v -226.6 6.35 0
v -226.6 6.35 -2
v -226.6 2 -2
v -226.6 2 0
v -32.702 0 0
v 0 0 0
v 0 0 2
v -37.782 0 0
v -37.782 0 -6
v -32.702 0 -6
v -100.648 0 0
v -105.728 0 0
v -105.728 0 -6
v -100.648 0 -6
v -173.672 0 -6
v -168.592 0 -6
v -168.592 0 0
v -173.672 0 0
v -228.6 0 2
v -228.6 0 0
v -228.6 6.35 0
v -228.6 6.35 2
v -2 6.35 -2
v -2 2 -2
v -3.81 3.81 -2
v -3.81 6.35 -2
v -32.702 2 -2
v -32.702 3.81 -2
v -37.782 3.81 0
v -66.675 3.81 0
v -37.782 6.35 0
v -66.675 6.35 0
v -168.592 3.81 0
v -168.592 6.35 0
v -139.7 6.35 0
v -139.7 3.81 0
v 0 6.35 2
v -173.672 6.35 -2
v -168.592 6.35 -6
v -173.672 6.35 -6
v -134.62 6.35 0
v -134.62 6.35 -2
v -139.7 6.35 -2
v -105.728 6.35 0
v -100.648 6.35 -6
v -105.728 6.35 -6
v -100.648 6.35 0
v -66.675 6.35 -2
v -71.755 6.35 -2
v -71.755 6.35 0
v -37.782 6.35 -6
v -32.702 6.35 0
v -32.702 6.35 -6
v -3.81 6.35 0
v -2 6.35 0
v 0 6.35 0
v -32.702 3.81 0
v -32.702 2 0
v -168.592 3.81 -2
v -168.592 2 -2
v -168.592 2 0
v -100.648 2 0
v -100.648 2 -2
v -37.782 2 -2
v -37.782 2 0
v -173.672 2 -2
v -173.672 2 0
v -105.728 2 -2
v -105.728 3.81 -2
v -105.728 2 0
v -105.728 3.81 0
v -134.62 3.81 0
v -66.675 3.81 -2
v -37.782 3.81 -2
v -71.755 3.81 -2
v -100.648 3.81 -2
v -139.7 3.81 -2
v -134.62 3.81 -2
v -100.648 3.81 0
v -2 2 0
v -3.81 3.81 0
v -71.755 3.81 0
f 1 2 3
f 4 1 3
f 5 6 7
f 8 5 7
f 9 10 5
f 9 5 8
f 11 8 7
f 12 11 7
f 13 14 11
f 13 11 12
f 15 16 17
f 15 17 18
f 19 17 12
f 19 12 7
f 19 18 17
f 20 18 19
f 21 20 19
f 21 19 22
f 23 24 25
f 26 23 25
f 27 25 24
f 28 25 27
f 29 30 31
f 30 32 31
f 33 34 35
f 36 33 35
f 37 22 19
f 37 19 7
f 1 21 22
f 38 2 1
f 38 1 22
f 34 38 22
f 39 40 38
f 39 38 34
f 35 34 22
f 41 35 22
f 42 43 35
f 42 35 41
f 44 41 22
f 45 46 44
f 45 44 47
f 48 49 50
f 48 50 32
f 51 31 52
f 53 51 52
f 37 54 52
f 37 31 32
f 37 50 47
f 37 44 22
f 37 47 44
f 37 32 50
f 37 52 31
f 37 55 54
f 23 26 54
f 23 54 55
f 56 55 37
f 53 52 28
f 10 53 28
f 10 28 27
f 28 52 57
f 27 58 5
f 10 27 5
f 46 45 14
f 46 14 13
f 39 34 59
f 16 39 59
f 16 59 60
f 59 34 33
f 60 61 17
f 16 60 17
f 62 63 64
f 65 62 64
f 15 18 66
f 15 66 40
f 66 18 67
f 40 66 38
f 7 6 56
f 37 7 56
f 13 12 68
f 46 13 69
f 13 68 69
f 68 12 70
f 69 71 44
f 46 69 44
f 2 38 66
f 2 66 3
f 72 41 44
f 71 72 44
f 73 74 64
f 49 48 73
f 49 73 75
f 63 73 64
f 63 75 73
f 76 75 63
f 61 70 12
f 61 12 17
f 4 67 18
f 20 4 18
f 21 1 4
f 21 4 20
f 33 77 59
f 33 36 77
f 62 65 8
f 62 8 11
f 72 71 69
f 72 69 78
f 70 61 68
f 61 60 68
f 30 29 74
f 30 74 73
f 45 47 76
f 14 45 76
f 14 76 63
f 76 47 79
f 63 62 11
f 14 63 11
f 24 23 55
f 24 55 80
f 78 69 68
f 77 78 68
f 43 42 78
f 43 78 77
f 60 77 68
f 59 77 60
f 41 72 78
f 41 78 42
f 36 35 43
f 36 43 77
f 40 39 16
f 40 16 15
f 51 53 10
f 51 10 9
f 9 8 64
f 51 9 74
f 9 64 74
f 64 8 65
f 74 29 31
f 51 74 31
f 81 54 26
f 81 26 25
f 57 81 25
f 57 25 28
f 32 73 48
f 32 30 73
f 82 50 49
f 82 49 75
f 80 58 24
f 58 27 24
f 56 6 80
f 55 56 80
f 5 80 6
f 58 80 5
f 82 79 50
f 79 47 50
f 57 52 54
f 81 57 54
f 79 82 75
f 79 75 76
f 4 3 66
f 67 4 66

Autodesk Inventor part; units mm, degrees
ref_plane "YZ Plane" through (0, 0, 0) normal (1, 0, 0) x (0, 1, 0)
ref_plane "XZ Plane" through (0, 0, 0) normal (0, 1, 0) x (-1, 0, 0)
ref_plane "XY Plane" through (0, 0, 0) normal (0, 0, 1) x (1, 0, 0)
sketch "Sketch1" plane through (0, 0, 0) normal (0, 0, 1) x (1, 0, 0)
  line L0 (0, 0) -> (-6.35, 0) construction
  line L1 (-6.35, 0) -> (-6.35, 6.35) construction
  line L2 (-6.35, 6.35) -> (0, 6.35) construction
  line L3 (0, 6.35) -> (0, 0) construction
  line L4 (-6.35, 6.35) -> (-30.1625, 6.35)
  line L5 (-30.1625, 6.35) -> (-30.1625, 28.575)
  line L6 (-30.1625, 28.575) -> (-6.35, 28.575)
  line L7 (-6.35, 28.575) -> (-6.35, 6.35)
  line L8 (-30.1625, 6.35) -> (-35.2425, 6.35) construction
  line L9 (-35.2425, 6.35) -> (-35.2425, 0) construction
  line L10 (-35.2425, 0) -> (-30.1625, 0) construction
  line L11 (-30.1625, 0) -> (-30.1625, 6.35) construction
  line L12 (-40.3225, 6.35) -> (-64.135, 6.35)
  line L13 (-64.135, 6.35) -> (-64.135, 28.575)
  line L14 (-64.135, 28.575) -> (-40.3225, 28.575)
  line L15 (-40.3225, 28.575) -> (-40.3225, 6.35)
  line L16 (-64.135, 6.35) -> (-69.215, 6.35) construction
  line L17 (-69.215, 6.35) -> (-69.215, 0) construction
  line L18 (-69.215, 0) -> (-64.135, 0) construction
  line L19 (-64.135, 0) -> (-64.135, 6.35) construction
  line L20 (-74.295, 6.35) -> (-98.1075, 6.35)
  line L21 (-98.1075, 6.35) -> (-98.1075, 28.575)
  line L22 (-98.1075, 28.575) -> (-74.295, 28.575)
  line L23 (-74.295, 28.575) -> (-74.295, 6.35)
  line L24 (-98.1075, 6.35) -> (-103.1875, 6.35) construction
  line L25 (-103.1875, 6.35) -> (-103.1875, 0) construction
  line L26 (-103.1875, 0) -> (-98.1075, 0) construction
  line L27 (-98.1075, 0) -> (-98.1075, 6.35) construction
  line L28 (-108.2675, 6.35) -> (-132.08, 6.35)
  line L29 (-132.08, 6.35) -> (-132.08, 28.575)
  line L30 (-132.08, 28.575) -> (-108.2675, 28.575)
  line L31 (-108.2675, 28.575) -> (-108.2675, 6.35)
  line L32 (-132.08, 6.35) -> (-137.16, 6.35) construction
  line L33 (-137.16, 6.35) -> (-137.16, 0) construction
  line L34 (-137.16, 0) -> (-132.08, 0) construction
  line L35 (-132.08, 0) -> (-132.08, 6.35) construction
  line L36 (-6.35, 40.005) -> (-30.1625, 40.005)
  line L37 (-30.1625, 40.005) -> (-30.1625, 62.23)
  line L38 (-30.1625, 62.23) -> (-6.35, 62.23)
  line L39 (-6.35, 62.23) -> (-6.35, 40.005)
  line L40 (-30.1625, 40.005) -> (-35.2425, 40.005) construction
  line L41 (-35.2425, 40.005) -> (-35.2425, 33.655) construction
  line L42 (-35.2425, 33.655) -> (-30.1625, 33.655) construction
  line L43 (-30.1625, 33.655) -> (-30.1625, 40.005) construction
  line L44 (-40.3225, 40.005) -> (-64.135, 40.005)
  line L45 (-64.135, 40.005) -> (-64.135, 62.23)
  line L46 (-64.135, 62.23) -> (-40.3225, 62.23)
  line L47 (-40.3225, 62.23) -> (-40.3225, 40.005)
  line L48 (-64.135, 40.005) -> (-69.215, 40.005) construction
  line L49 (-69.215, 40.005) -> (-69.215, 33.655) construction
  line L50 (-69.215, 33.655) -> (-64.135, 33.655) construction
  line L51 (-64.135, 33.655) -> (-64.135, 40.005) construction
  line L52 (-74.295, 40.005) -> (-98.1075, 40.005)
  line L53 (-98.1075, 40.005) -> (-98.1075, 62.23)
  line L54 (-98.1075, 62.23) -> (-74.295, 62.23)
  line L55 (-74.295, 62.23) -> (-74.295, 40.005)
  line L56 (-98.1075, 40.005) -> (-103.1875, 40.005) construction
  line L57 (-103.1875, 40.005) -> (-103.1875, 33.655) construction
  line L58 (-103.1875, 33.655) -> (-98.1075, 33.655) construction
  line L59 (-98.1075, 33.655) -> (-98.1075, 40.005) construction
  line L60 (-108.2675, 40.005) -> (-132.08, 40.005)
  line L61 (-132.08, 40.005) -> (-132.08, 62.23)
  line L62 (-132.08, 62.23) -> (-108.2675, 62.23)
  line L63 (-108.2675, 62.23) -> (-108.2675, 40.005)
  line L64 (-132.08, 40.005) -> (-137.16, 40.005) construction
  line L65 (-137.16, 40.005) -> (-137.16, 33.655) construction
  line L66 (-137.16, 33.655) -> (-132.08, 33.655) construction
  line L67 (-132.08, 33.655) -> (-132.08, 40.005) construction
  line L68 (0, -0.5542) -> (0, 69.2958)
  line L69 (0, 62.9458) -> (0, 69.2958)
  line L70 (-142.24, 6.35) -> (-166.0525, 6.35)
  line L71 (-166.0525, 6.35) -> (-166.0525, 28.575)
  line L72 (-166.0525, 28.575) -> (-142.24, 28.575)
  line L73 (-142.24, 28.575) -> (-142.24, 6.35)
  line L74 (-166.0525, 6.35) -> (-171.1325, 6.35) construction
  line L75 (-171.1325, 6.35) -> (-171.1325, 0) construction
  line L76 (-171.1325, 0) -> (-166.0525, 0) construction
  line L77 (-166.0525, 0) -> (-166.0525, 6.35) construction
  line L78 (-142.24, 40.005) -> (-166.0525, 40.005)
  line L79 (-166.0525, 40.005) -> (-166.0525, 62.23)
  line L80 (-166.0525, 62.23) -> (-142.24, 62.23)
  line L81 (-142.24, 62.23) -> (-142.24, 40.005)
  line L82 (-166.0525, 40.005) -> (-171.1325, 40.005) construction
  line L83 (-171.1325, 40.005) -> (-171.1325, 33.655) construction
  line L84 (-171.1325, 33.655) -> (-166.0525, 33.655) construction
  line L85 (-166.0525, 33.655) -> (-166.0525, 40.005) construction
  line L86 (0, 0) -> (-228.6, 0)
  line L87 (-228.6, 0) -> (-228.6, 69.85)
  line L88 (-228.6, 69.85) -> (0, 69.85)
  line L89 (0, 69.85) -> (0, 0)
  circle A0 centre (-181.6894, 55.6895) radius 6.5405
  line L90 (-228.6, 0) -> (-173.696, 0) construction
  line L91 (-173.696, 69.85) -> (-228.6, 69.85) construction
  line L92 (-228.6, 69.85) -> (-228.6, 0) construction
  line L93 (-228.6, 69.85) -> (-228.6, 42.1979) construction
  line L94 (-228.6, 42.1979) -> (-228.6, 34.925) construction
  line L95 (-228.6, 69.85) -> (-166.0525, 69.85) construction
  line L96 (-166.0525, 69.85) -> (-166.0525, 0) construction
  line L97 (-166.0525, 0) -> (-228.6, 0) construction
  line L98 (-228.6, 0) -> (-228.6, 69.85) construction
  line L99 (-166.0525, 69.85) -> (-197.3262, 69.85) construction
  line L100 (-197.3262, 69.85) -> (-197.3262, 0) construction
  line L101 (-197.3262, 0) -> (-166.0525, 0) construction
  line L102 (-166.0525, 0) -> (-166.0525, 69.85) construction
  circle A1 centre (-181.6894, 36.6395) radius 6.5405
  circle A2 centre (-181.6894, 17.5895) radius 6.5405
  circle A3 centre (-212.9631, 55.6895) radius 6.5405
  circle A4 centre (-212.9631, 36.6395) radius 6.5405
  circle A5 centre (-212.9631, 17.5895) radius 6.5405
  point P0 (-40.3225, 0)
  point P1 (-74.295, 0)
  point P2 (-108.2675, 0)
  point P3 (-6.35, 33.655)
  point P4 (-40.3225, 33.655)
  point P5 (-74.295, 33.655)
  point P6 (-108.2675, 33.655)
  point P7 (-142.24, 0)
  point P8 (-142.24, 33.655)
  point P9 (-181.6894, 69.85)
  dimension "d0" = 6.35
  dimension "d1" = 6.35
  dimension "d2" = 23.8125
  dimension "d3" = 22.225
  dimension "d4" = 5.08
  dimension "d7" = 33.9725
  dimension "d10" = 33.655
  dimension "d13" = 69.85
  dimension "d16" = 228.6
  dimension "d17" = 69.85
  dimension "d58" = 13.081
  dimension "d59" = 14.1605
  dimension "d62" = 19.05
extrude "Extrusion1" add sketch "Sketch1" along normal blind 2
sketch "Sketch3" plane through (0, 0, 0) normal (0, 0, -1) x (-1, 0, 0)
  line L0 (228.6, 69.85) -> (228.6, 0) projected
  line L1 (0, 69.85) -> (228.6, 69.85) projected
  line L2 (0, 0) -> (0, 69.85) projected
  line L3 (228.6, 0) -> (0, 0) projected
  circle A0 centre (181.6894, 55.6895) radius 6.5405 projected
  line L4 (142.24, 40.005) -> (166.0525, 40.005) projected
  line L5 (142.24, 62.23) -> (142.24, 40.005) projected
  line L6 (166.0525, 62.23) -> (142.24, 62.23) projected
  line L7 (166.0525, 40.005) -> (166.0525, 62.23) projected
  line L8 (142.24, 6.35) -> (166.0525, 6.35) projected
  line L9 (142.24, 28.575) -> (142.24, 6.35) projected
  line L10 (166.0525, 28.575) -> (142.24, 28.575) projected
  line L11 (166.0525, 6.35) -> (166.0525, 28.575) projected
  line L12 (108.2675, 40.005) -> (132.08, 40.005) projected
  line L13 (108.2675, 62.23) -> (108.2675, 40.005) projected
  line L14 (132.08, 62.23) -> (108.2675, 62.23) projected
  line L15 (132.08, 40.005) -> (132.08, 62.23) projected
  line L16 (74.295, 40.005) -> (98.1075, 40.005) projected
  line L17 (74.295, 62.23) -> (74.295, 40.005) projected
  line L18 (98.1075, 62.23) -> (74.295, 62.23) projected
  line L19 (98.1075, 40.005) -> (98.1075, 62.23) projected
  line L20 (40.3225, 40.005) -> (64.135, 40.005) projected
  line L21 (40.3225, 62.23) -> (40.3225, 40.005) projected
  line L22 (64.135, 62.23) -> (40.3225, 62.23) projected
  line L23 (64.135, 40.005) -> (64.135, 62.23) projected
  line L24 (6.35, 40.005) -> (30.1625, 40.005) projected
  line L25 (6.35, 62.23) -> (6.35, 40.005) projected
  line L26 (30.1625, 62.23) -> (6.35, 62.23) projected
  line L27 (30.1625, 40.005) -> (30.1625, 62.23) projected
  line L28 (108.2675, 6.35) -> (132.08, 6.35) projected
  line L29 (108.2675, 28.575) -> (108.2675, 6.35) projected
  line L30 (132.08, 28.575) -> (108.2675, 28.575) projected
  line L31 (132.08, 6.35) -> (132.08, 28.575) projected
  line L32 (74.295, 6.35) -> (98.1075, 6.35) projected
  line L33 (74.295, 28.575) -> (74.295, 6.35) projected
  line L34 (98.1075, 28.575) -> (74.295, 28.575) projected
  line L35 (98.1075, 6.35) -> (98.1075, 28.575) projected
  line L36 (40.3225, 6.35) -> (64.135, 6.35) projected
  line L37 (40.3225, 28.575) -> (40.3225, 6.35) projected
  line L38 (64.135, 28.575) -> (40.3225, 28.575) projected
  line L39 (64.135, 6.35) -> (64.135, 28.575) projected
  line L40 (6.35, 6.35) -> (30.1625, 6.35) projected
  line L41 (6.35, 28.575) -> (6.35, 6.35) projected
  line L42 (30.1625, 28.575) -> (6.35, 28.575) projected
  line L43 (30.1625, 6.35) -> (30.1625, 28.575) projected
  line L44 (3.81, 37.465) -> (32.7025, 37.465)
  line L45 (32.7025, 37.465) -> (32.7025, 64.77)
  line L46 (32.7025, 64.77) -> (3.81, 64.77)
  line L47 (3.81, 64.77) -> (3.81, 37.465)
  line L48 (37.7825, 37.465) -> (66.675, 37.465)
  line L49 (66.675, 37.465) -> (66.675, 64.77)
  line L50 (66.675, 64.77) -> (37.7825, 64.77)
  line L51 (37.7825, 64.77) -> (37.7825, 37.465)
  line L52 (71.755, 37.465) -> (100.6475, 37.465)
  line L53 (100.6475, 37.465) -> (100.6475, 64.77)
  line L54 (100.6475, 64.77) -> (71.755, 64.77)
  line L55 (71.755, 64.77) -> (71.755, 37.465)
  line L56 (105.7275, 37.465) -> (134.62, 37.465)
  line L57 (134.62, 37.465) -> (134.62, 64.77)
  line L58 (134.62, 64.77) -> (105.7275, 64.77)
  line L59 (105.7275, 64.77) -> (105.7275, 37.465)
  line L60 (139.7, 37.465) -> (168.5925, 37.465)
  line L61 (168.5925, 37.465) -> (168.5925, 64.77)
  line L62 (168.5925, 64.77) -> (139.7, 64.77)
  line L63 (139.7, 64.77) -> (139.7, 37.465)
  line L64 (139.7, 3.81) -> (168.5925, 3.81)
  line L65 (168.5925, 3.81) -> (168.5925, 31.115)
  line L66 (168.5925, 31.115) -> (139.7, 31.115)
  line L67 (139.7, 31.115) -> (139.7, 3.81)
  line L68 (105.7275, 3.81) -> (134.62, 3.81)
  line L69 (134.62, 3.81) -> (134.62, 31.115)
  line L70 (134.62, 31.115) -> (105.7275, 31.115)
  line L71 (105.7275, 31.115) -> (105.7275, 3.81)
  line L72 (71.755, 3.81) -> (100.6475, 3.81)
  line L73 (100.6475, 3.81) -> (100.6475, 31.115)
  line L74 (100.6475, 31.115) -> (71.755, 31.115)
  line L75 (71.755, 31.115) -> (71.755, 3.81)
  line L76 (37.7825, 3.81) -> (66.675, 3.81)
  line L77 (66.675, 3.81) -> (66.675, 31.115)
  line L78 (66.675, 31.115) -> (37.7825, 31.115)
  line L79 (37.7825, 31.115) -> (37.7825, 3.81)
  line L80 (3.81, 3.81) -> (32.7025, 3.81)
  line L81 (32.7025, 3.81) -> (32.7025, 31.115)
  line L82 (32.7025, 31.115) -> (3.81, 31.115)
  line L83 (3.81, 31.115) -> (3.81, 3.81)
  line L84 (228.6, 69.85) -> (228.6, 0) projected
  line L85 (0, 69.85) -> (228.6, 69.85) projected
  line L86 (0, 0) -> (0, 69.85) projected
  line L87 (228.6, 0) -> (0, 0) projected
  circle A1 centre (181.6894, 55.6895) radius 6.5405 projected
  circle A2 centre (181.6894, 36.6395) radius 6.5405 projected
  circle A3 centre (181.6894, 17.5895) radius 6.5405 projected
  circle A4 centre (212.9631, 36.6395) radius 6.5405 projected
  circle A5 centre (212.9631, 55.6895) radius 6.5405 projected
  circle A6 centre (212.9631, 17.5895) radius 6.5405 projected
  line L88 (142.24, 40.005) -> (166.0525, 40.005) projected
  line L89 (142.24, 62.23) -> (142.24, 40.005) projected
  line L90 (166.0525, 62.23) -> (142.24, 62.23) projected
  line L91 (166.0525, 40.005) -> (166.0525, 62.23) projected
  line L92 (142.24, 6.35) -> (166.0525, 6.35) projected
  line L93 (142.24, 28.575) -> (142.24, 6.35) projected
  line L94 (166.0525, 28.575) -> (142.24, 28.575) projected
  line L95 (166.0525, 6.35) -> (166.0525, 28.575) projected
  line L96 (108.2675, 40.005) -> (132.08, 40.005) projected
  line L97 (108.2675, 62.23) -> (108.2675, 40.005) projected
  line L98 (132.08, 62.23) -> (108.2675, 62.23) projected
  line L99 (132.08, 40.005) -> (132.08, 62.23) projected
  line L100 (74.295, 40.005) -> (98.1075, 40.005) projected
  line L101 (74.295, 62.23) -> (74.295, 40.005) projected
  line L102 (98.1075, 62.23) -> (74.295, 62.23) projected
  line L103 (98.1075, 40.005) -> (98.1075, 62.23) projected
  line L104 (40.3225, 40.005) -> (64.135, 40.005) projected
  line L105 (40.3225, 62.23) -> (40.3225, 40.005) projected
  line L106 (64.135, 62.23) -> (40.3225, 62.23) projected
  line L107 (64.135, 40.005) -> (64.135, 62.23) projected
  line L108 (6.35, 40.005) -> (30.1625, 40.005) projected
  line L109 (6.35, 62.23) -> (6.35, 40.005) projected
  line L110 (30.1625, 62.23) -> (6.35, 62.23) projected
  line L111 (30.1625, 40.005) -> (30.1625, 62.23) projected
  line L112 (108.2675, 6.35) -> (132.08, 6.35) projected
  line L113 (108.2675, 28.575) -> (108.2675, 6.35) projected
  line L114 (132.08, 28.575) -> (108.2675, 28.575) projected
  line L115 (132.08, 6.35) -> (132.08, 28.575) projected
  line L116 (74.295, 6.35) -> (98.1075, 6.35) projected
  line L117 (74.295, 28.575) -> (74.295, 6.35) projected
  line L118 (98.1075, 28.575) -> (74.295, 28.575) projected
  line L119 (98.1075, 6.35) -> (98.1075, 28.575) projected
  line L120 (40.3225, 6.35) -> (64.135, 6.35) projected
  line L121 (40.3225, 28.575) -> (40.3225, 6.35) projected
  line L122 (64.135, 28.575) -> (40.3225, 28.575) projected
  line L123 (64.135, 6.35) -> (64.135, 28.575) projected
  line L124 (6.35, 6.35) -> (30.1625, 6.35) projected
  line L125 (6.35, 28.575) -> (6.35, 6.35) projected
  line L126 (30.1625, 28.575) -> (6.35, 28.575) projected
  line L127 (30.1625, 6.35) -> (30.1625, 28.575) projected
  circle A7 centre (181.6894, 55.6895) radius 9.0805
  circle A8 centre (212.9631, 55.6895) radius 9.0805
  circle A9 centre (212.9631, 36.6395) radius 9.0805
  circle A10 centre (212.9631, 17.5895) radius 9.0805
  circle A11 centre (181.6894, 17.5895) radius 9.0805
  circle A12 centre (181.6894, 36.6395) radius 9.0805
  dimension "d48" = 2.54
  dimension "d49" = 2.54
  dimension "d50" = 2.54
  dimension "d51" = 2.54
  dimension "d52" = 2.54
  dimension "d53" = 2.54
  dimension "d54" = 2.54
  dimension "d55" = 2.54
  dimension "d56" = 2.54
  dimension "d57" = 2.54
  dimension "d67" = 2.54
  dimension "d68" = 2.54
  dimension "d69" = 2.54
  dimension "d70" = 2.54
  dimension "d71" = 2.54
  dimension "d72" = 2.54
extrude "Extrusion2" add sketch "Sketch3" along normal blind 2 contours L0 L3 L2 L1
sketch "Sketch4" plane through (0, 0, -2) normal (0, 0, -1) x (-1, 0, 0)
  line L0 (228.6, 0) -> (228.6, 69.85) construction
  line L1 (228.6, 69.85) -> (0, 69.85) construction
  line L2 (0, 69.85) -> (0, 0) construction
  line L3 (0, 0) -> (228.6, 0) construction
  circle A0 centre (181.6894, 36.6395) radius 9.0805 construction
  circle A1 centre (181.6894, 17.5895) radius 9.0805 construction
  circle A2 centre (212.9631, 17.5895) radius 9.0805 construction
  circle A3 centre (212.9631, 36.6395) radius 9.0805 construction
  circle A4 centre (212.9631, 55.6895) radius 9.0805 construction
  circle A5 centre (181.6894, 55.6895) radius 9.0805 construction
  line L4 (3.81, 3.81) -> (3.81, 31.115) construction
  line L5 (3.81, 31.115) -> (32.7025, 31.115) construction
  line L6 (32.7025, 31.115) -> (32.7025, 3.81) construction
  line L7 (32.7025, 3.81) -> (3.81, 3.81) construction
  line L8 (37.7825, 3.81) -> (37.7825, 31.115) construction
  line L9 (37.7825, 31.115) -> (66.675, 31.115) construction
  line L10 (66.675, 31.115) -> (66.675, 3.81) construction
  line L11 (66.675, 3.81) -> (37.7825, 3.81) construction
  line L12 (71.755, 3.81) -> (71.755, 31.115) construction
  line L13 (71.755, 31.115) -> (100.6475, 31.115) construction
  line L14 (100.6475, 31.115) -> (100.6475, 3.81) construction
  line L15 (100.6475, 3.81) -> (71.755, 3.81) construction
  line L16 (105.7275, 3.81) -> (105.7275, 31.115) construction
  line L17 (105.7275, 31.115) -> (134.62, 31.115) construction
  line L18 (134.62, 31.115) -> (134.62, 3.81) construction
  line L19 (134.62, 3.81) -> (105.7275, 3.81) construction
  line L20 (139.7, 3.81) -> (139.7, 31.115) construction
  line L21 (139.7, 31.115) -> (168.5925, 31.115) construction
  line L22 (168.5925, 31.115) -> (168.5925, 3.81) construction
  line L23 (168.5925, 3.81) -> (139.7, 3.81) construction
  line L24 (139.7, 37.465) -> (139.7, 64.77) construction
  line L25 (139.7, 64.77) -> (168.5925, 64.77) construction
  line L26 (168.5925, 64.77) -> (168.5925, 37.465) construction
  line L27 (168.5925, 37.465) -> (139.7, 37.465) construction
  line L28 (105.7275, 37.465) -> (105.7275, 64.77) construction
  line L29 (105.7275, 64.77) -> (134.62, 64.77) construction
  line L30 (134.62, 64.77) -> (134.62, 37.465) construction
  line L31 (134.62, 37.465) -> (105.7275, 37.465) construction
  line L32 (71.755, 37.465) -> (71.755, 64.77) construction
  line L33 (71.755, 64.77) -> (100.6475, 64.77) construction
  line L34 (100.6475, 64.77) -> (100.6475, 37.465) construction
  line L35 (100.6475, 37.465) -> (71.755, 37.465) construction
  line L36 (37.7825, 37.465) -> (37.7825, 64.77) construction
  line L37 (37.7825, 64.77) -> (66.675, 64.77) construction
  line L38 (66.675, 64.77) -> (66.675, 37.465) construction
  line L39 (66.675, 37.465) -> (37.7825, 37.465) construction
  line L40 (3.81, 37.465) -> (3.81, 64.77) construction
  line L41 (3.81, 64.77) -> (32.7025, 64.77) construction
  line L42 (32.7025, 64.77) -> (32.7025, 37.465) construction
  line L43 (32.7025, 37.465) -> (3.81, 37.465) construction
  line L44 (0, 69.85) -> (2, 69.85)
  line L45 (2, 69.85) -> (2, 0)
  line L46 (2, 0) -> (0, 0)
  line L47 (0, 0) -> (0, 69.85)
  line L48 (228.6, 69.85) -> (226.6, 69.85)
  line L49 (226.6, 69.85) -> (226.6, 0)
  line L50 (226.6, 0) -> (228.6, 0)
  line L51 (228.6, 0) -> (228.6, 69.85)
  dimension "d75" = 2
  dimension "d76" = 2
extrude "Extrusion3" cut sketch "Sketch4" against normal blind 2
sketch "Sketch5" plane through (0, 0, -2) normal (0, 0, -1) x (-1, 0, 0)
  line L0 (2, 0) -> (226.6, 0) projected
  line L1 (226.6, 0) -> (226.6, 69.85) projected
  line L2 (2, 0) -> (226.6, 0)
  line L3 (226.6, 0) -> (226.6, 2)
  line L4 (226.6, 2) -> (2, 2)
  line L5 (2, 2) -> (2, 0)
  line L6 (2, 69.85) -> (2, 0) construction
  line L7 (2, 0) -> (226.6, 0) construction
  line L8 (226.6, 0) -> (226.6, 69.85) construction
  line L9 (226.6, 69.85) -> (2, 69.85) construction
  circle A0 centre (181.6894, 36.6395) radius 9.0805 construction
  circle A1 centre (181.6894, 17.5895) radius 9.0805 construction
  circle A2 centre (212.9631, 17.5895) radius 9.0805 construction
  circle A3 centre (212.9631, 36.6395) radius 9.0805 construction
  circle A4 centre (212.9631, 55.6895) radius 9.0805 construction
  circle A5 centre (181.6894, 55.6895) radius 9.0805 construction
  line L10 (3.81, 3.81) -> (3.81, 31.115) construction
  line L11 (3.81, 31.115) -> (32.7025, 31.115) construction
  line L12 (32.7025, 31.115) -> (32.7025, 3.81) construction
  line L13 (32.7025, 3.81) -> (3.81, 3.81) construction
  line L14 (37.7825, 3.81) -> (37.7825, 31.115) construction
  line L15 (37.7825, 31.115) -> (66.675, 31.115) construction
  line L16 (66.675, 31.115) -> (66.675, 3.81) construction
  line L17 (66.675, 3.81) -> (37.7825, 3.81) construction
  line L18 (71.755, 3.81) -> (71.755, 31.115) construction
  line L19 (71.755, 31.115) -> (100.6475, 31.115) construction
  line L20 (100.6475, 31.115) -> (100.6475, 3.81) construction
  line L21 (100.6475, 3.81) -> (71.755, 3.81) construction
  line L22 (105.7275, 3.81) -> (105.7275, 31.115) construction
  line L23 (105.7275, 31.115) -> (134.62, 31.115) construction
  line L24 (134.62, 31.115) -> (134.62, 3.81) construction
  line L25 (134.62, 3.81) -> (105.7275, 3.81) construction
  line L26 (139.7, 3.81) -> (139.7, 31.115) construction
  line L27 (139.7, 31.115) -> (168.5925, 31.115) construction
  line L28 (168.5925, 31.115) -> (168.5925, 3.81) construction
  line L29 (168.5925, 3.81) -> (139.7, 3.81) construction
  line L30 (139.7, 37.465) -> (139.7, 64.77) construction
  line L31 (139.7, 64.77) -> (168.5925, 64.77) construction
  line L32 (168.5925, 64.77) -> (168.5925, 37.465) construction
  line L33 (168.5925, 37.465) -> (139.7, 37.465) construction
  line L34 (105.7275, 37.465) -> (105.7275, 64.77) construction
  line L35 (105.7275, 64.77) -> (134.62, 64.77) construction
  line L36 (134.62, 64.77) -> (134.62, 37.465) construction
  line L37 (134.62, 37.465) -> (105.7275, 37.465) construction
  line L38 (71.755, 37.465) -> (71.755, 64.77) construction
  line L39 (71.755, 64.77) -> (100.6475, 64.77) construction
  line L40 (100.6475, 64.77) -> (100.6475, 37.465) construction
  line L41 (100.6475, 37.465) -> (71.755, 37.465) construction
  line L42 (37.7825, 37.465) -> (37.7825, 64.77) construction
  line L43 (37.7825, 64.77) -> (66.675, 64.77) construction
  line L44 (66.675, 64.77) -> (66.675, 37.465) construction
  line L45 (66.675, 37.465) -> (37.7825, 37.465) construction
  line L46 (3.81, 37.465) -> (3.81, 64.77) construction
  line L47 (3.81, 64.77) -> (32.7025, 64.77) construction
  line L48 (32.7025, 64.77) -> (32.7025, 37.465) construction
  line L49 (32.7025, 37.465) -> (3.81, 37.465) construction
  line L50 (2, 69.85) -> (226.6, 69.85) construction
  line L51 (226.6, 69.85) -> (226.6, 67.85) construction
  line L52 (226.6, 67.85) -> (2, 67.85) construction
  line L53 (2, 67.85) -> (2, 69.85) construction
  line L54 (2, 67.85) -> (226.6, 67.85)
  line L55 (226.6, 67.85) -> (226.6, 69.85)
  line L56 (226.6, 69.85) -> (2, 69.85)
  line L57 (2, 69.85) -> (2, 67.85)
  point P0 (0, 0)
  dimension "d79" = 2
  dimension "d80" = 2
extrude "Extrusion4" cut sketch "Sketch5" against normal blind 2
sketch "Sketch6" plane through (0, 0, -2) normal (0, 0, -1) x (-1, 0, 0)
  line L0 (2, 2) -> (226.6, 2) construction
  line L1 (226.6, 2) -> (226.6, 67.85) construction
  line L2 (226.6, 67.85) -> (2, 67.85) construction
  line L3 (2, 67.85) -> (2, 2) construction
  circle A0 centre (181.6894, 36.6395) radius 9.0805 construction
  circle A1 centre (181.6894, 17.5895) radius 9.0805 construction
  circle A2 centre (212.9631, 17.5895) radius 9.0805 construction
  circle A3 centre (212.9631, 36.6395) radius 9.0805 construction
  circle A4 centre (212.9631, 55.6895) radius 9.0805 construction
  circle A5 centre (181.6894, 55.6895) radius 9.0805 construction
  line L4 (3.81, 3.81) -> (3.81, 31.115) construction
  line L5 (3.81, 31.115) -> (32.7025, 31.115) construction
  line L6 (32.7025, 31.115) -> (32.7025, 3.81) construction
  line L7 (32.7025, 3.81) -> (3.81, 3.81) construction
  line L8 (37.7825, 3.81) -> (37.7825, 31.115) construction
  line L9 (37.7825, 31.115) -> (66.675, 31.115) construction
  line L10 (66.675, 31.115) -> (66.675, 3.81) construction
  line L11 (66.675, 3.81) -> (37.7825, 3.81) construction
  line L12 (71.755, 3.81) -> (71.755, 31.115) construction
  line L13 (71.755, 31.115) -> (100.6475, 31.115) construction
  line L14 (100.6475, 31.115) -> (100.6475, 3.81) construction
  line L15 (100.6475, 3.81) -> (71.755, 3.81) construction
  line L16 (105.7275, 3.81) -> (105.7275, 31.115) construction
  line L17 (105.7275, 31.115) -> (134.62, 31.115) construction
  line L18 (134.62, 31.115) -> (134.62, 3.81) construction
  line L19 (134.62, 3.81) -> (105.7275, 3.81) construction
  line L20 (139.7, 3.81) -> (139.7, 31.115) construction
  line L21 (139.7, 31.115) -> (168.5925, 31.115) construction
  line L22 (168.5925, 31.115) -> (168.5925, 3.81) construction
  line L23 (168.5925, 3.81) -> (139.7, 3.81) construction
  line L24 (139.7, 37.465) -> (139.7, 64.77) construction
  line L25 (139.7, 64.77) -> (168.5925, 64.77) construction
  line L26 (168.5925, 64.77) -> (168.5925, 37.465) construction
  line L27 (168.5925, 37.465) -> (139.7, 37.465) construction
  line L28 (105.7275, 37.465) -> (105.7275, 64.77) construction
  line L29 (105.7275, 64.77) -> (134.62, 64.77) construction
  line L30 (134.62, 64.77) -> (134.62, 37.465) construction
  line L31 (134.62, 37.465) -> (105.7275, 37.465) construction
  line L32 (71.755, 37.465) -> (71.755, 64.77) construction
  line L33 (71.755, 64.77) -> (100.6475, 64.77) construction
  line L34 (100.6475, 64.77) -> (100.6475, 37.465) construction
  line L35 (100.6475, 37.465) -> (71.755, 37.465) construction
  line L36 (37.7825, 37.465) -> (37.7825, 64.77) construction
  line L37 (37.7825, 64.77) -> (66.675, 64.77) construction
  line L38 (66.675, 64.77) -> (66.675, 37.465) construction
  line L39 (66.675, 37.465) -> (37.7825, 37.465) construction
  line L40 (3.81, 37.465) -> (3.81, 64.77) construction
  line L41 (3.81, 64.77) -> (32.7025, 64.77) construction
  line L42 (32.7025, 64.77) -> (32.7025, 37.465) construction
  line L43 (32.7025, 37.465) -> (3.81, 37.465) construction
  line L44 (37.7825, 3.81) -> (37.7825, 31.115) construction
  line L45 (32.7025, 2) -> (37.7825, 2) construction
  line L46 (37.7825, 2) -> (37.7825, 14.7) construction
  line L47 (37.7825, 14.7) -> (32.7025, 14.7) construction
  line L48 (32.7025, 14.7) -> (32.7025, 2) construction
  line L49 (228.6, 0) -> (0, 0) construction
  line L50 (228.6, 69.85) -> (228.6, 0) construction
  line L51 (0, 69.85) -> (228.6, 69.85) construction
  line L52 (0, 0) -> (0, 69.85) construction
  line L53 (2, 2) -> (226.6, 2) construction
  line L54 (2, 67.85) -> (2, 2) construction
  line L55 (226.6, 67.85) -> (2, 67.85) construction
  line L56 (226.6, 2) -> (226.6, 67.85) construction
  line L57 (32.7025, 0) -> (37.7825, 0) construction
  line L58 (37.7825, 0) -> (37.7825, 10.16) construction
  line L59 (37.7825, 10.16) -> (32.7025, 10.16) construction
  line L60 (32.7025, 10.16) -> (32.7025, 0) construction
  line L61 (32.7025, 0) -> (37.7825, 0) construction
  line L62 (37.7825, 0) -> (37.7825, 14.7) construction
  line L63 (37.7825, 14.7) -> (32.7025, 14.7) construction
  line L64 (32.7025, 14.7) -> (32.7025, 0) construction
  line L65 (37.7825, 14.7) -> (32.7025, 14.7)
  line L66 (32.7025, 14.7) -> (32.7025, 0)
  line L67 (32.7025, 0) -> (37.7825, 0)
  line L68 (37.7825, 0) -> (37.7825, 14.7)
  line L69 (105.7275, 14.7) -> (100.6475, 14.7)
  line L70 (100.6475, 14.7) -> (100.6475, 0)
  line L71 (100.6475, 0) -> (105.7275, 0)
  line L72 (105.7275, 0) -> (105.7275, 14.7)
  line L73 (168.5925, 0) -> (173.6725, 0)
  line L74 (173.6725, 0) -> (173.6725, 10.16)
  line L75 (173.6725, 10.16) -> (168.5925, 10.16)
  line L76 (168.5925, 10.16) -> (168.5925, 0)
  dimension "d83" = 12.7
  dimension "d84" = 10.16
  dimension "d85" = 5.08
  dimension "d86" = 10.16
extrude "Extrusion5" add sketch "Sketch6" along normal blind 4 and the other way blind 2
sketch "Sketch7" plane through (0, 0, 0) normal (0, 0, -1) x (-1, 0, 0)
  line L0 (173.6725, 2) -> (173.6725, 0) construction
  line L1 (228.6, 0) -> (173.6725, 0) construction
  line L2 (228.6, 69.85) -> (228.6, 0) construction
  line L3 (0, 69.85) -> (228.6, 69.85) construction
  line L4 (0, 0) -> (0, 69.85) construction
  line L5 (32.7025, 0) -> (0, 0) construction
  line L6 (32.7025, 0) -> (32.7025, 2) construction
  line L7 (2, 2) -> (32.7025, 2) construction
  line L8 (2, 67.85) -> (2, 2) construction
  line L9 (226.6, 67.85) -> (2, 67.85) construction
  line L10 (226.6, 2) -> (226.6, 67.85) construction
  line L11 (173.6725, 2) -> (226.6, 2) construction
  line L12 (100.6475, 0) -> (100.6475, 2) construction
  line L13 (37.7825, 2) -> (100.6475, 2) construction
  line L14 (37.7825, 2) -> (37.7825, 0) construction
  line L15 (100.6475, 0) -> (37.7825, 0) construction
  line L16 (168.5925, 0) -> (168.5925, 2) construction
  line L17 (105.7275, 2) -> (168.5925, 2) construction
  line L18 (105.7275, 2) -> (105.7275, 0) construction
  line L19 (168.5925, 0) -> (105.7275, 0) construction
  line L20 (32.7025, 14.7) -> (32.7025, 0) construction
  line L21 (32.7025, 0) -> (37.7825, 0) construction
  line L22 (37.7825, 0) -> (37.7825, 14.7) construction
  line L23 (37.7825, 14.7) -> (32.7025, 14.7) construction
  line L24 (100.6475, 14.7) -> (100.6475, 0) construction
  line L25 (100.6475, 0) -> (105.7275, 0) construction
  line L26 (105.7275, 0) -> (105.7275, 14.7) construction
  line L27 (105.7275, 14.7) -> (100.6475, 14.7) construction
  line L28 (173.6725, 0) -> (173.6725, 10.16) construction
  line L29 (173.6725, 10.16) -> (168.5925, 10.16) construction
  line L30 (168.5925, 10.16) -> (168.5925, 0) construction
  line L31 (168.5925, 0) -> (173.6725, 0) construction
  line L32 (0, 0) -> (32.7025, 0) construction
  dimension "d91" = 32.7025
  dimension "d92" = 62.865
  dimension "d93" = 62.865
sketch "Sketch8" plane through (-228.6, 69.85, 2) normal (0, 1, 0) x (1, 0, 0)
  line L0 (-1.655, 10.7869) -> (231.4102, 10.7869)
  line L1 (231.4102, 10.7869) -> (231.4102, -6.2526)
  line L2 (231.4102, -6.2526) -> (-1.655, -6.2526)
  line L3 (-1.655, -6.2526) -> (-1.655, 10.7869)
  point P0 (228.6, 2)
extrude "Extrusion6" cut sketch "Sketch8" against normal blind 63.5
properties part number "front_panel"
